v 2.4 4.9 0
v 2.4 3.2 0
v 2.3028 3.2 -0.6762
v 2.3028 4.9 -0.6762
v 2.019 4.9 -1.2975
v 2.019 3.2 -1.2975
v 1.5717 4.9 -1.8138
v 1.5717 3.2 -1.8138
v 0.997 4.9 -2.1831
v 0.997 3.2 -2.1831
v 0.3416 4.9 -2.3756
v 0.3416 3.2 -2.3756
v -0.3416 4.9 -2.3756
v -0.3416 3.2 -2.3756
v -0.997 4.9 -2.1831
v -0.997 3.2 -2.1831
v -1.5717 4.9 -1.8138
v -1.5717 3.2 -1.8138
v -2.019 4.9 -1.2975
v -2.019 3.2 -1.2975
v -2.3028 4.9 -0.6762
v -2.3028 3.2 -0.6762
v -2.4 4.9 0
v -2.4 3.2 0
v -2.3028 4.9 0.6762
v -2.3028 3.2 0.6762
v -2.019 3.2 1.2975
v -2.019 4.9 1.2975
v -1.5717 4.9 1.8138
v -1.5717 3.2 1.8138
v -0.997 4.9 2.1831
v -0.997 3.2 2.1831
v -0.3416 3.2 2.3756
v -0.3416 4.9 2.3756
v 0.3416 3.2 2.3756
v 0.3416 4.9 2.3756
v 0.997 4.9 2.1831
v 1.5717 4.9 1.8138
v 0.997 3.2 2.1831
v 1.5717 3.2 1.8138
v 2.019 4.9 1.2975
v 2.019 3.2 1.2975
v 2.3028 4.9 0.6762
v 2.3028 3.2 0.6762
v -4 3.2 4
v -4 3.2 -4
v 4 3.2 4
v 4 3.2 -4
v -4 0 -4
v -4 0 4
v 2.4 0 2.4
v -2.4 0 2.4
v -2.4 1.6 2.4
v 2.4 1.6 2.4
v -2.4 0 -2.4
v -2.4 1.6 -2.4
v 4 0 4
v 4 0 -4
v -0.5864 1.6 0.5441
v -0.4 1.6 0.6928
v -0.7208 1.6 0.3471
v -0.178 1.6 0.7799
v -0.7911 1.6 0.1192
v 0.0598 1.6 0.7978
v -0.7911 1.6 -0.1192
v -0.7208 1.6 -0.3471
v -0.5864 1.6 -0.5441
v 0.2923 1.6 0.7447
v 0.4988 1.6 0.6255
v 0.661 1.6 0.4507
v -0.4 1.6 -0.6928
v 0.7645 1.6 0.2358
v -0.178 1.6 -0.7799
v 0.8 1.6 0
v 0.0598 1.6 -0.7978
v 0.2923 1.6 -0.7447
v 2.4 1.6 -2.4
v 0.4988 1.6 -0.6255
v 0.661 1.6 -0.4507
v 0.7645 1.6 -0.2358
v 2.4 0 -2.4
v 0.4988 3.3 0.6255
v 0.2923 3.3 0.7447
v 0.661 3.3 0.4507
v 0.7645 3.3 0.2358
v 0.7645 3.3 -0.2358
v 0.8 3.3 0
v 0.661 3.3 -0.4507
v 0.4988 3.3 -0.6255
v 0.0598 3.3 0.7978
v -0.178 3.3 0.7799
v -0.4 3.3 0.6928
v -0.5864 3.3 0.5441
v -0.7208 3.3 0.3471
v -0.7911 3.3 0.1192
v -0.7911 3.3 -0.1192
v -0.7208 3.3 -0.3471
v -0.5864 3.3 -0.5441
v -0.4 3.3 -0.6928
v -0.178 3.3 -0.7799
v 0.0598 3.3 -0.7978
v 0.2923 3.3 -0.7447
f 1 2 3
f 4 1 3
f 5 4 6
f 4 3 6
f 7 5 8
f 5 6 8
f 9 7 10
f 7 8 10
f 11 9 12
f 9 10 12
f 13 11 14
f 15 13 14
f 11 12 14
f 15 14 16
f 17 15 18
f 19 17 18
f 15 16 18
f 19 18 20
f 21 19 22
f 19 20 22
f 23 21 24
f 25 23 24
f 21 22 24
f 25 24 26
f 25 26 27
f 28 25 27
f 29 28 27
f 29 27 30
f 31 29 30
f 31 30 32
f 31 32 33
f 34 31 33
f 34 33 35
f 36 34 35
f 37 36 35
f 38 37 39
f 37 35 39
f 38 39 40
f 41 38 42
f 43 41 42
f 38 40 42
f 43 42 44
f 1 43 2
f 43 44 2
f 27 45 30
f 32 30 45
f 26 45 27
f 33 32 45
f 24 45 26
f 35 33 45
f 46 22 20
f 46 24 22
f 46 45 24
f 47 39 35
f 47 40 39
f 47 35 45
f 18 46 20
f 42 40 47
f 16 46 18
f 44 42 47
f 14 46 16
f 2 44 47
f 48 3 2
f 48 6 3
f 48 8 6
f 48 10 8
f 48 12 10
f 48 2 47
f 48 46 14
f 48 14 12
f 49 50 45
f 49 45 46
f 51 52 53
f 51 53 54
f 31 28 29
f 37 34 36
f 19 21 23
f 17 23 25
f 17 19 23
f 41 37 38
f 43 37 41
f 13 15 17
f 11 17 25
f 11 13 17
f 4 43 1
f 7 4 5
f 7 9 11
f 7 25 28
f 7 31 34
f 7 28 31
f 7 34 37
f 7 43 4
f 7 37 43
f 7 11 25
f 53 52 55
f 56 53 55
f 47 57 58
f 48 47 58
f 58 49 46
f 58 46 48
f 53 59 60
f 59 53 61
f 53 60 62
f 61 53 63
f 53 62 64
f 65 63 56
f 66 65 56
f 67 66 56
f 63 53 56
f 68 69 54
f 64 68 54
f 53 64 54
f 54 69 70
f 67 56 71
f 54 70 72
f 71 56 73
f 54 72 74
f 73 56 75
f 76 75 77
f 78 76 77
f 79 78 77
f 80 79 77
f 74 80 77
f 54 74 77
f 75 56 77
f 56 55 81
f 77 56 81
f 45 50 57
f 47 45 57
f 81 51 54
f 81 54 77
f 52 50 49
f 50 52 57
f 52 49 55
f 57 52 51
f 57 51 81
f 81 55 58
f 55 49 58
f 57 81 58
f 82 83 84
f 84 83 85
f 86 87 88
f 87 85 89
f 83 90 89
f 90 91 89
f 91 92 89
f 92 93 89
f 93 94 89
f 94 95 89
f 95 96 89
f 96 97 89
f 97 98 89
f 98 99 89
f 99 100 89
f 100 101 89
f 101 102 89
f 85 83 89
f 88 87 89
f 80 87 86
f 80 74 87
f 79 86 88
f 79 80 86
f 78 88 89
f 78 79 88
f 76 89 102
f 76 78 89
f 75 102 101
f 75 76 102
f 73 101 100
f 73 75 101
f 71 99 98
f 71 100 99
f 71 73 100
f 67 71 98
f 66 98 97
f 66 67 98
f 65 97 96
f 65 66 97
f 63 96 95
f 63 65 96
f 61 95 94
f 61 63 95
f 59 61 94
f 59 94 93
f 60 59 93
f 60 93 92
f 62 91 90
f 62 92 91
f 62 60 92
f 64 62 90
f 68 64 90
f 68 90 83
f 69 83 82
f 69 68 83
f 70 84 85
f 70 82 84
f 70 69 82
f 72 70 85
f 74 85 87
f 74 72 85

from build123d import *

# Parameters (mm, degrees)
SKETCH_1_W      = 8
SKETCH_1_H      = 8
HEIGHT_DEPTH    = 3.2
SKETCH_2_R      = 2.4
EXTRUDE_2_DEPTH = 1.7
SHELL_1_T       = -1.6


with BuildPart() as part:
    # 草圖1 → height (new body)
    with BuildSketch(Plane(origin=(0, 0, 0), x_dir=(1, 0, 0), z_dir=(0, 1, 0))):
        Rectangle(SKETCH_1_W, SKETCH_1_H)
    extrude(amount=HEIGHT_DEPTH)

    # 草圖2 → 填料-伸長2 (add)
    with BuildSketch(Plane(origin=(0, 3.2, 0), x_dir=(1, 0, 0), z_dir=(0, 1, 0))):
        Circle(SKETCH_2_R)
    extrude(amount=EXTRUDE_2_DEPTH)

    # 薄殼1
    shell_1_openings = [part.faces().sort_by_distance(p)[0] for p in [
        (0, 0, 0),
    ]]
    offset(amount=SHELL_1_T, openings=shell_1_openings, kind=Kind.INTERSECTION)


solid = part.part
